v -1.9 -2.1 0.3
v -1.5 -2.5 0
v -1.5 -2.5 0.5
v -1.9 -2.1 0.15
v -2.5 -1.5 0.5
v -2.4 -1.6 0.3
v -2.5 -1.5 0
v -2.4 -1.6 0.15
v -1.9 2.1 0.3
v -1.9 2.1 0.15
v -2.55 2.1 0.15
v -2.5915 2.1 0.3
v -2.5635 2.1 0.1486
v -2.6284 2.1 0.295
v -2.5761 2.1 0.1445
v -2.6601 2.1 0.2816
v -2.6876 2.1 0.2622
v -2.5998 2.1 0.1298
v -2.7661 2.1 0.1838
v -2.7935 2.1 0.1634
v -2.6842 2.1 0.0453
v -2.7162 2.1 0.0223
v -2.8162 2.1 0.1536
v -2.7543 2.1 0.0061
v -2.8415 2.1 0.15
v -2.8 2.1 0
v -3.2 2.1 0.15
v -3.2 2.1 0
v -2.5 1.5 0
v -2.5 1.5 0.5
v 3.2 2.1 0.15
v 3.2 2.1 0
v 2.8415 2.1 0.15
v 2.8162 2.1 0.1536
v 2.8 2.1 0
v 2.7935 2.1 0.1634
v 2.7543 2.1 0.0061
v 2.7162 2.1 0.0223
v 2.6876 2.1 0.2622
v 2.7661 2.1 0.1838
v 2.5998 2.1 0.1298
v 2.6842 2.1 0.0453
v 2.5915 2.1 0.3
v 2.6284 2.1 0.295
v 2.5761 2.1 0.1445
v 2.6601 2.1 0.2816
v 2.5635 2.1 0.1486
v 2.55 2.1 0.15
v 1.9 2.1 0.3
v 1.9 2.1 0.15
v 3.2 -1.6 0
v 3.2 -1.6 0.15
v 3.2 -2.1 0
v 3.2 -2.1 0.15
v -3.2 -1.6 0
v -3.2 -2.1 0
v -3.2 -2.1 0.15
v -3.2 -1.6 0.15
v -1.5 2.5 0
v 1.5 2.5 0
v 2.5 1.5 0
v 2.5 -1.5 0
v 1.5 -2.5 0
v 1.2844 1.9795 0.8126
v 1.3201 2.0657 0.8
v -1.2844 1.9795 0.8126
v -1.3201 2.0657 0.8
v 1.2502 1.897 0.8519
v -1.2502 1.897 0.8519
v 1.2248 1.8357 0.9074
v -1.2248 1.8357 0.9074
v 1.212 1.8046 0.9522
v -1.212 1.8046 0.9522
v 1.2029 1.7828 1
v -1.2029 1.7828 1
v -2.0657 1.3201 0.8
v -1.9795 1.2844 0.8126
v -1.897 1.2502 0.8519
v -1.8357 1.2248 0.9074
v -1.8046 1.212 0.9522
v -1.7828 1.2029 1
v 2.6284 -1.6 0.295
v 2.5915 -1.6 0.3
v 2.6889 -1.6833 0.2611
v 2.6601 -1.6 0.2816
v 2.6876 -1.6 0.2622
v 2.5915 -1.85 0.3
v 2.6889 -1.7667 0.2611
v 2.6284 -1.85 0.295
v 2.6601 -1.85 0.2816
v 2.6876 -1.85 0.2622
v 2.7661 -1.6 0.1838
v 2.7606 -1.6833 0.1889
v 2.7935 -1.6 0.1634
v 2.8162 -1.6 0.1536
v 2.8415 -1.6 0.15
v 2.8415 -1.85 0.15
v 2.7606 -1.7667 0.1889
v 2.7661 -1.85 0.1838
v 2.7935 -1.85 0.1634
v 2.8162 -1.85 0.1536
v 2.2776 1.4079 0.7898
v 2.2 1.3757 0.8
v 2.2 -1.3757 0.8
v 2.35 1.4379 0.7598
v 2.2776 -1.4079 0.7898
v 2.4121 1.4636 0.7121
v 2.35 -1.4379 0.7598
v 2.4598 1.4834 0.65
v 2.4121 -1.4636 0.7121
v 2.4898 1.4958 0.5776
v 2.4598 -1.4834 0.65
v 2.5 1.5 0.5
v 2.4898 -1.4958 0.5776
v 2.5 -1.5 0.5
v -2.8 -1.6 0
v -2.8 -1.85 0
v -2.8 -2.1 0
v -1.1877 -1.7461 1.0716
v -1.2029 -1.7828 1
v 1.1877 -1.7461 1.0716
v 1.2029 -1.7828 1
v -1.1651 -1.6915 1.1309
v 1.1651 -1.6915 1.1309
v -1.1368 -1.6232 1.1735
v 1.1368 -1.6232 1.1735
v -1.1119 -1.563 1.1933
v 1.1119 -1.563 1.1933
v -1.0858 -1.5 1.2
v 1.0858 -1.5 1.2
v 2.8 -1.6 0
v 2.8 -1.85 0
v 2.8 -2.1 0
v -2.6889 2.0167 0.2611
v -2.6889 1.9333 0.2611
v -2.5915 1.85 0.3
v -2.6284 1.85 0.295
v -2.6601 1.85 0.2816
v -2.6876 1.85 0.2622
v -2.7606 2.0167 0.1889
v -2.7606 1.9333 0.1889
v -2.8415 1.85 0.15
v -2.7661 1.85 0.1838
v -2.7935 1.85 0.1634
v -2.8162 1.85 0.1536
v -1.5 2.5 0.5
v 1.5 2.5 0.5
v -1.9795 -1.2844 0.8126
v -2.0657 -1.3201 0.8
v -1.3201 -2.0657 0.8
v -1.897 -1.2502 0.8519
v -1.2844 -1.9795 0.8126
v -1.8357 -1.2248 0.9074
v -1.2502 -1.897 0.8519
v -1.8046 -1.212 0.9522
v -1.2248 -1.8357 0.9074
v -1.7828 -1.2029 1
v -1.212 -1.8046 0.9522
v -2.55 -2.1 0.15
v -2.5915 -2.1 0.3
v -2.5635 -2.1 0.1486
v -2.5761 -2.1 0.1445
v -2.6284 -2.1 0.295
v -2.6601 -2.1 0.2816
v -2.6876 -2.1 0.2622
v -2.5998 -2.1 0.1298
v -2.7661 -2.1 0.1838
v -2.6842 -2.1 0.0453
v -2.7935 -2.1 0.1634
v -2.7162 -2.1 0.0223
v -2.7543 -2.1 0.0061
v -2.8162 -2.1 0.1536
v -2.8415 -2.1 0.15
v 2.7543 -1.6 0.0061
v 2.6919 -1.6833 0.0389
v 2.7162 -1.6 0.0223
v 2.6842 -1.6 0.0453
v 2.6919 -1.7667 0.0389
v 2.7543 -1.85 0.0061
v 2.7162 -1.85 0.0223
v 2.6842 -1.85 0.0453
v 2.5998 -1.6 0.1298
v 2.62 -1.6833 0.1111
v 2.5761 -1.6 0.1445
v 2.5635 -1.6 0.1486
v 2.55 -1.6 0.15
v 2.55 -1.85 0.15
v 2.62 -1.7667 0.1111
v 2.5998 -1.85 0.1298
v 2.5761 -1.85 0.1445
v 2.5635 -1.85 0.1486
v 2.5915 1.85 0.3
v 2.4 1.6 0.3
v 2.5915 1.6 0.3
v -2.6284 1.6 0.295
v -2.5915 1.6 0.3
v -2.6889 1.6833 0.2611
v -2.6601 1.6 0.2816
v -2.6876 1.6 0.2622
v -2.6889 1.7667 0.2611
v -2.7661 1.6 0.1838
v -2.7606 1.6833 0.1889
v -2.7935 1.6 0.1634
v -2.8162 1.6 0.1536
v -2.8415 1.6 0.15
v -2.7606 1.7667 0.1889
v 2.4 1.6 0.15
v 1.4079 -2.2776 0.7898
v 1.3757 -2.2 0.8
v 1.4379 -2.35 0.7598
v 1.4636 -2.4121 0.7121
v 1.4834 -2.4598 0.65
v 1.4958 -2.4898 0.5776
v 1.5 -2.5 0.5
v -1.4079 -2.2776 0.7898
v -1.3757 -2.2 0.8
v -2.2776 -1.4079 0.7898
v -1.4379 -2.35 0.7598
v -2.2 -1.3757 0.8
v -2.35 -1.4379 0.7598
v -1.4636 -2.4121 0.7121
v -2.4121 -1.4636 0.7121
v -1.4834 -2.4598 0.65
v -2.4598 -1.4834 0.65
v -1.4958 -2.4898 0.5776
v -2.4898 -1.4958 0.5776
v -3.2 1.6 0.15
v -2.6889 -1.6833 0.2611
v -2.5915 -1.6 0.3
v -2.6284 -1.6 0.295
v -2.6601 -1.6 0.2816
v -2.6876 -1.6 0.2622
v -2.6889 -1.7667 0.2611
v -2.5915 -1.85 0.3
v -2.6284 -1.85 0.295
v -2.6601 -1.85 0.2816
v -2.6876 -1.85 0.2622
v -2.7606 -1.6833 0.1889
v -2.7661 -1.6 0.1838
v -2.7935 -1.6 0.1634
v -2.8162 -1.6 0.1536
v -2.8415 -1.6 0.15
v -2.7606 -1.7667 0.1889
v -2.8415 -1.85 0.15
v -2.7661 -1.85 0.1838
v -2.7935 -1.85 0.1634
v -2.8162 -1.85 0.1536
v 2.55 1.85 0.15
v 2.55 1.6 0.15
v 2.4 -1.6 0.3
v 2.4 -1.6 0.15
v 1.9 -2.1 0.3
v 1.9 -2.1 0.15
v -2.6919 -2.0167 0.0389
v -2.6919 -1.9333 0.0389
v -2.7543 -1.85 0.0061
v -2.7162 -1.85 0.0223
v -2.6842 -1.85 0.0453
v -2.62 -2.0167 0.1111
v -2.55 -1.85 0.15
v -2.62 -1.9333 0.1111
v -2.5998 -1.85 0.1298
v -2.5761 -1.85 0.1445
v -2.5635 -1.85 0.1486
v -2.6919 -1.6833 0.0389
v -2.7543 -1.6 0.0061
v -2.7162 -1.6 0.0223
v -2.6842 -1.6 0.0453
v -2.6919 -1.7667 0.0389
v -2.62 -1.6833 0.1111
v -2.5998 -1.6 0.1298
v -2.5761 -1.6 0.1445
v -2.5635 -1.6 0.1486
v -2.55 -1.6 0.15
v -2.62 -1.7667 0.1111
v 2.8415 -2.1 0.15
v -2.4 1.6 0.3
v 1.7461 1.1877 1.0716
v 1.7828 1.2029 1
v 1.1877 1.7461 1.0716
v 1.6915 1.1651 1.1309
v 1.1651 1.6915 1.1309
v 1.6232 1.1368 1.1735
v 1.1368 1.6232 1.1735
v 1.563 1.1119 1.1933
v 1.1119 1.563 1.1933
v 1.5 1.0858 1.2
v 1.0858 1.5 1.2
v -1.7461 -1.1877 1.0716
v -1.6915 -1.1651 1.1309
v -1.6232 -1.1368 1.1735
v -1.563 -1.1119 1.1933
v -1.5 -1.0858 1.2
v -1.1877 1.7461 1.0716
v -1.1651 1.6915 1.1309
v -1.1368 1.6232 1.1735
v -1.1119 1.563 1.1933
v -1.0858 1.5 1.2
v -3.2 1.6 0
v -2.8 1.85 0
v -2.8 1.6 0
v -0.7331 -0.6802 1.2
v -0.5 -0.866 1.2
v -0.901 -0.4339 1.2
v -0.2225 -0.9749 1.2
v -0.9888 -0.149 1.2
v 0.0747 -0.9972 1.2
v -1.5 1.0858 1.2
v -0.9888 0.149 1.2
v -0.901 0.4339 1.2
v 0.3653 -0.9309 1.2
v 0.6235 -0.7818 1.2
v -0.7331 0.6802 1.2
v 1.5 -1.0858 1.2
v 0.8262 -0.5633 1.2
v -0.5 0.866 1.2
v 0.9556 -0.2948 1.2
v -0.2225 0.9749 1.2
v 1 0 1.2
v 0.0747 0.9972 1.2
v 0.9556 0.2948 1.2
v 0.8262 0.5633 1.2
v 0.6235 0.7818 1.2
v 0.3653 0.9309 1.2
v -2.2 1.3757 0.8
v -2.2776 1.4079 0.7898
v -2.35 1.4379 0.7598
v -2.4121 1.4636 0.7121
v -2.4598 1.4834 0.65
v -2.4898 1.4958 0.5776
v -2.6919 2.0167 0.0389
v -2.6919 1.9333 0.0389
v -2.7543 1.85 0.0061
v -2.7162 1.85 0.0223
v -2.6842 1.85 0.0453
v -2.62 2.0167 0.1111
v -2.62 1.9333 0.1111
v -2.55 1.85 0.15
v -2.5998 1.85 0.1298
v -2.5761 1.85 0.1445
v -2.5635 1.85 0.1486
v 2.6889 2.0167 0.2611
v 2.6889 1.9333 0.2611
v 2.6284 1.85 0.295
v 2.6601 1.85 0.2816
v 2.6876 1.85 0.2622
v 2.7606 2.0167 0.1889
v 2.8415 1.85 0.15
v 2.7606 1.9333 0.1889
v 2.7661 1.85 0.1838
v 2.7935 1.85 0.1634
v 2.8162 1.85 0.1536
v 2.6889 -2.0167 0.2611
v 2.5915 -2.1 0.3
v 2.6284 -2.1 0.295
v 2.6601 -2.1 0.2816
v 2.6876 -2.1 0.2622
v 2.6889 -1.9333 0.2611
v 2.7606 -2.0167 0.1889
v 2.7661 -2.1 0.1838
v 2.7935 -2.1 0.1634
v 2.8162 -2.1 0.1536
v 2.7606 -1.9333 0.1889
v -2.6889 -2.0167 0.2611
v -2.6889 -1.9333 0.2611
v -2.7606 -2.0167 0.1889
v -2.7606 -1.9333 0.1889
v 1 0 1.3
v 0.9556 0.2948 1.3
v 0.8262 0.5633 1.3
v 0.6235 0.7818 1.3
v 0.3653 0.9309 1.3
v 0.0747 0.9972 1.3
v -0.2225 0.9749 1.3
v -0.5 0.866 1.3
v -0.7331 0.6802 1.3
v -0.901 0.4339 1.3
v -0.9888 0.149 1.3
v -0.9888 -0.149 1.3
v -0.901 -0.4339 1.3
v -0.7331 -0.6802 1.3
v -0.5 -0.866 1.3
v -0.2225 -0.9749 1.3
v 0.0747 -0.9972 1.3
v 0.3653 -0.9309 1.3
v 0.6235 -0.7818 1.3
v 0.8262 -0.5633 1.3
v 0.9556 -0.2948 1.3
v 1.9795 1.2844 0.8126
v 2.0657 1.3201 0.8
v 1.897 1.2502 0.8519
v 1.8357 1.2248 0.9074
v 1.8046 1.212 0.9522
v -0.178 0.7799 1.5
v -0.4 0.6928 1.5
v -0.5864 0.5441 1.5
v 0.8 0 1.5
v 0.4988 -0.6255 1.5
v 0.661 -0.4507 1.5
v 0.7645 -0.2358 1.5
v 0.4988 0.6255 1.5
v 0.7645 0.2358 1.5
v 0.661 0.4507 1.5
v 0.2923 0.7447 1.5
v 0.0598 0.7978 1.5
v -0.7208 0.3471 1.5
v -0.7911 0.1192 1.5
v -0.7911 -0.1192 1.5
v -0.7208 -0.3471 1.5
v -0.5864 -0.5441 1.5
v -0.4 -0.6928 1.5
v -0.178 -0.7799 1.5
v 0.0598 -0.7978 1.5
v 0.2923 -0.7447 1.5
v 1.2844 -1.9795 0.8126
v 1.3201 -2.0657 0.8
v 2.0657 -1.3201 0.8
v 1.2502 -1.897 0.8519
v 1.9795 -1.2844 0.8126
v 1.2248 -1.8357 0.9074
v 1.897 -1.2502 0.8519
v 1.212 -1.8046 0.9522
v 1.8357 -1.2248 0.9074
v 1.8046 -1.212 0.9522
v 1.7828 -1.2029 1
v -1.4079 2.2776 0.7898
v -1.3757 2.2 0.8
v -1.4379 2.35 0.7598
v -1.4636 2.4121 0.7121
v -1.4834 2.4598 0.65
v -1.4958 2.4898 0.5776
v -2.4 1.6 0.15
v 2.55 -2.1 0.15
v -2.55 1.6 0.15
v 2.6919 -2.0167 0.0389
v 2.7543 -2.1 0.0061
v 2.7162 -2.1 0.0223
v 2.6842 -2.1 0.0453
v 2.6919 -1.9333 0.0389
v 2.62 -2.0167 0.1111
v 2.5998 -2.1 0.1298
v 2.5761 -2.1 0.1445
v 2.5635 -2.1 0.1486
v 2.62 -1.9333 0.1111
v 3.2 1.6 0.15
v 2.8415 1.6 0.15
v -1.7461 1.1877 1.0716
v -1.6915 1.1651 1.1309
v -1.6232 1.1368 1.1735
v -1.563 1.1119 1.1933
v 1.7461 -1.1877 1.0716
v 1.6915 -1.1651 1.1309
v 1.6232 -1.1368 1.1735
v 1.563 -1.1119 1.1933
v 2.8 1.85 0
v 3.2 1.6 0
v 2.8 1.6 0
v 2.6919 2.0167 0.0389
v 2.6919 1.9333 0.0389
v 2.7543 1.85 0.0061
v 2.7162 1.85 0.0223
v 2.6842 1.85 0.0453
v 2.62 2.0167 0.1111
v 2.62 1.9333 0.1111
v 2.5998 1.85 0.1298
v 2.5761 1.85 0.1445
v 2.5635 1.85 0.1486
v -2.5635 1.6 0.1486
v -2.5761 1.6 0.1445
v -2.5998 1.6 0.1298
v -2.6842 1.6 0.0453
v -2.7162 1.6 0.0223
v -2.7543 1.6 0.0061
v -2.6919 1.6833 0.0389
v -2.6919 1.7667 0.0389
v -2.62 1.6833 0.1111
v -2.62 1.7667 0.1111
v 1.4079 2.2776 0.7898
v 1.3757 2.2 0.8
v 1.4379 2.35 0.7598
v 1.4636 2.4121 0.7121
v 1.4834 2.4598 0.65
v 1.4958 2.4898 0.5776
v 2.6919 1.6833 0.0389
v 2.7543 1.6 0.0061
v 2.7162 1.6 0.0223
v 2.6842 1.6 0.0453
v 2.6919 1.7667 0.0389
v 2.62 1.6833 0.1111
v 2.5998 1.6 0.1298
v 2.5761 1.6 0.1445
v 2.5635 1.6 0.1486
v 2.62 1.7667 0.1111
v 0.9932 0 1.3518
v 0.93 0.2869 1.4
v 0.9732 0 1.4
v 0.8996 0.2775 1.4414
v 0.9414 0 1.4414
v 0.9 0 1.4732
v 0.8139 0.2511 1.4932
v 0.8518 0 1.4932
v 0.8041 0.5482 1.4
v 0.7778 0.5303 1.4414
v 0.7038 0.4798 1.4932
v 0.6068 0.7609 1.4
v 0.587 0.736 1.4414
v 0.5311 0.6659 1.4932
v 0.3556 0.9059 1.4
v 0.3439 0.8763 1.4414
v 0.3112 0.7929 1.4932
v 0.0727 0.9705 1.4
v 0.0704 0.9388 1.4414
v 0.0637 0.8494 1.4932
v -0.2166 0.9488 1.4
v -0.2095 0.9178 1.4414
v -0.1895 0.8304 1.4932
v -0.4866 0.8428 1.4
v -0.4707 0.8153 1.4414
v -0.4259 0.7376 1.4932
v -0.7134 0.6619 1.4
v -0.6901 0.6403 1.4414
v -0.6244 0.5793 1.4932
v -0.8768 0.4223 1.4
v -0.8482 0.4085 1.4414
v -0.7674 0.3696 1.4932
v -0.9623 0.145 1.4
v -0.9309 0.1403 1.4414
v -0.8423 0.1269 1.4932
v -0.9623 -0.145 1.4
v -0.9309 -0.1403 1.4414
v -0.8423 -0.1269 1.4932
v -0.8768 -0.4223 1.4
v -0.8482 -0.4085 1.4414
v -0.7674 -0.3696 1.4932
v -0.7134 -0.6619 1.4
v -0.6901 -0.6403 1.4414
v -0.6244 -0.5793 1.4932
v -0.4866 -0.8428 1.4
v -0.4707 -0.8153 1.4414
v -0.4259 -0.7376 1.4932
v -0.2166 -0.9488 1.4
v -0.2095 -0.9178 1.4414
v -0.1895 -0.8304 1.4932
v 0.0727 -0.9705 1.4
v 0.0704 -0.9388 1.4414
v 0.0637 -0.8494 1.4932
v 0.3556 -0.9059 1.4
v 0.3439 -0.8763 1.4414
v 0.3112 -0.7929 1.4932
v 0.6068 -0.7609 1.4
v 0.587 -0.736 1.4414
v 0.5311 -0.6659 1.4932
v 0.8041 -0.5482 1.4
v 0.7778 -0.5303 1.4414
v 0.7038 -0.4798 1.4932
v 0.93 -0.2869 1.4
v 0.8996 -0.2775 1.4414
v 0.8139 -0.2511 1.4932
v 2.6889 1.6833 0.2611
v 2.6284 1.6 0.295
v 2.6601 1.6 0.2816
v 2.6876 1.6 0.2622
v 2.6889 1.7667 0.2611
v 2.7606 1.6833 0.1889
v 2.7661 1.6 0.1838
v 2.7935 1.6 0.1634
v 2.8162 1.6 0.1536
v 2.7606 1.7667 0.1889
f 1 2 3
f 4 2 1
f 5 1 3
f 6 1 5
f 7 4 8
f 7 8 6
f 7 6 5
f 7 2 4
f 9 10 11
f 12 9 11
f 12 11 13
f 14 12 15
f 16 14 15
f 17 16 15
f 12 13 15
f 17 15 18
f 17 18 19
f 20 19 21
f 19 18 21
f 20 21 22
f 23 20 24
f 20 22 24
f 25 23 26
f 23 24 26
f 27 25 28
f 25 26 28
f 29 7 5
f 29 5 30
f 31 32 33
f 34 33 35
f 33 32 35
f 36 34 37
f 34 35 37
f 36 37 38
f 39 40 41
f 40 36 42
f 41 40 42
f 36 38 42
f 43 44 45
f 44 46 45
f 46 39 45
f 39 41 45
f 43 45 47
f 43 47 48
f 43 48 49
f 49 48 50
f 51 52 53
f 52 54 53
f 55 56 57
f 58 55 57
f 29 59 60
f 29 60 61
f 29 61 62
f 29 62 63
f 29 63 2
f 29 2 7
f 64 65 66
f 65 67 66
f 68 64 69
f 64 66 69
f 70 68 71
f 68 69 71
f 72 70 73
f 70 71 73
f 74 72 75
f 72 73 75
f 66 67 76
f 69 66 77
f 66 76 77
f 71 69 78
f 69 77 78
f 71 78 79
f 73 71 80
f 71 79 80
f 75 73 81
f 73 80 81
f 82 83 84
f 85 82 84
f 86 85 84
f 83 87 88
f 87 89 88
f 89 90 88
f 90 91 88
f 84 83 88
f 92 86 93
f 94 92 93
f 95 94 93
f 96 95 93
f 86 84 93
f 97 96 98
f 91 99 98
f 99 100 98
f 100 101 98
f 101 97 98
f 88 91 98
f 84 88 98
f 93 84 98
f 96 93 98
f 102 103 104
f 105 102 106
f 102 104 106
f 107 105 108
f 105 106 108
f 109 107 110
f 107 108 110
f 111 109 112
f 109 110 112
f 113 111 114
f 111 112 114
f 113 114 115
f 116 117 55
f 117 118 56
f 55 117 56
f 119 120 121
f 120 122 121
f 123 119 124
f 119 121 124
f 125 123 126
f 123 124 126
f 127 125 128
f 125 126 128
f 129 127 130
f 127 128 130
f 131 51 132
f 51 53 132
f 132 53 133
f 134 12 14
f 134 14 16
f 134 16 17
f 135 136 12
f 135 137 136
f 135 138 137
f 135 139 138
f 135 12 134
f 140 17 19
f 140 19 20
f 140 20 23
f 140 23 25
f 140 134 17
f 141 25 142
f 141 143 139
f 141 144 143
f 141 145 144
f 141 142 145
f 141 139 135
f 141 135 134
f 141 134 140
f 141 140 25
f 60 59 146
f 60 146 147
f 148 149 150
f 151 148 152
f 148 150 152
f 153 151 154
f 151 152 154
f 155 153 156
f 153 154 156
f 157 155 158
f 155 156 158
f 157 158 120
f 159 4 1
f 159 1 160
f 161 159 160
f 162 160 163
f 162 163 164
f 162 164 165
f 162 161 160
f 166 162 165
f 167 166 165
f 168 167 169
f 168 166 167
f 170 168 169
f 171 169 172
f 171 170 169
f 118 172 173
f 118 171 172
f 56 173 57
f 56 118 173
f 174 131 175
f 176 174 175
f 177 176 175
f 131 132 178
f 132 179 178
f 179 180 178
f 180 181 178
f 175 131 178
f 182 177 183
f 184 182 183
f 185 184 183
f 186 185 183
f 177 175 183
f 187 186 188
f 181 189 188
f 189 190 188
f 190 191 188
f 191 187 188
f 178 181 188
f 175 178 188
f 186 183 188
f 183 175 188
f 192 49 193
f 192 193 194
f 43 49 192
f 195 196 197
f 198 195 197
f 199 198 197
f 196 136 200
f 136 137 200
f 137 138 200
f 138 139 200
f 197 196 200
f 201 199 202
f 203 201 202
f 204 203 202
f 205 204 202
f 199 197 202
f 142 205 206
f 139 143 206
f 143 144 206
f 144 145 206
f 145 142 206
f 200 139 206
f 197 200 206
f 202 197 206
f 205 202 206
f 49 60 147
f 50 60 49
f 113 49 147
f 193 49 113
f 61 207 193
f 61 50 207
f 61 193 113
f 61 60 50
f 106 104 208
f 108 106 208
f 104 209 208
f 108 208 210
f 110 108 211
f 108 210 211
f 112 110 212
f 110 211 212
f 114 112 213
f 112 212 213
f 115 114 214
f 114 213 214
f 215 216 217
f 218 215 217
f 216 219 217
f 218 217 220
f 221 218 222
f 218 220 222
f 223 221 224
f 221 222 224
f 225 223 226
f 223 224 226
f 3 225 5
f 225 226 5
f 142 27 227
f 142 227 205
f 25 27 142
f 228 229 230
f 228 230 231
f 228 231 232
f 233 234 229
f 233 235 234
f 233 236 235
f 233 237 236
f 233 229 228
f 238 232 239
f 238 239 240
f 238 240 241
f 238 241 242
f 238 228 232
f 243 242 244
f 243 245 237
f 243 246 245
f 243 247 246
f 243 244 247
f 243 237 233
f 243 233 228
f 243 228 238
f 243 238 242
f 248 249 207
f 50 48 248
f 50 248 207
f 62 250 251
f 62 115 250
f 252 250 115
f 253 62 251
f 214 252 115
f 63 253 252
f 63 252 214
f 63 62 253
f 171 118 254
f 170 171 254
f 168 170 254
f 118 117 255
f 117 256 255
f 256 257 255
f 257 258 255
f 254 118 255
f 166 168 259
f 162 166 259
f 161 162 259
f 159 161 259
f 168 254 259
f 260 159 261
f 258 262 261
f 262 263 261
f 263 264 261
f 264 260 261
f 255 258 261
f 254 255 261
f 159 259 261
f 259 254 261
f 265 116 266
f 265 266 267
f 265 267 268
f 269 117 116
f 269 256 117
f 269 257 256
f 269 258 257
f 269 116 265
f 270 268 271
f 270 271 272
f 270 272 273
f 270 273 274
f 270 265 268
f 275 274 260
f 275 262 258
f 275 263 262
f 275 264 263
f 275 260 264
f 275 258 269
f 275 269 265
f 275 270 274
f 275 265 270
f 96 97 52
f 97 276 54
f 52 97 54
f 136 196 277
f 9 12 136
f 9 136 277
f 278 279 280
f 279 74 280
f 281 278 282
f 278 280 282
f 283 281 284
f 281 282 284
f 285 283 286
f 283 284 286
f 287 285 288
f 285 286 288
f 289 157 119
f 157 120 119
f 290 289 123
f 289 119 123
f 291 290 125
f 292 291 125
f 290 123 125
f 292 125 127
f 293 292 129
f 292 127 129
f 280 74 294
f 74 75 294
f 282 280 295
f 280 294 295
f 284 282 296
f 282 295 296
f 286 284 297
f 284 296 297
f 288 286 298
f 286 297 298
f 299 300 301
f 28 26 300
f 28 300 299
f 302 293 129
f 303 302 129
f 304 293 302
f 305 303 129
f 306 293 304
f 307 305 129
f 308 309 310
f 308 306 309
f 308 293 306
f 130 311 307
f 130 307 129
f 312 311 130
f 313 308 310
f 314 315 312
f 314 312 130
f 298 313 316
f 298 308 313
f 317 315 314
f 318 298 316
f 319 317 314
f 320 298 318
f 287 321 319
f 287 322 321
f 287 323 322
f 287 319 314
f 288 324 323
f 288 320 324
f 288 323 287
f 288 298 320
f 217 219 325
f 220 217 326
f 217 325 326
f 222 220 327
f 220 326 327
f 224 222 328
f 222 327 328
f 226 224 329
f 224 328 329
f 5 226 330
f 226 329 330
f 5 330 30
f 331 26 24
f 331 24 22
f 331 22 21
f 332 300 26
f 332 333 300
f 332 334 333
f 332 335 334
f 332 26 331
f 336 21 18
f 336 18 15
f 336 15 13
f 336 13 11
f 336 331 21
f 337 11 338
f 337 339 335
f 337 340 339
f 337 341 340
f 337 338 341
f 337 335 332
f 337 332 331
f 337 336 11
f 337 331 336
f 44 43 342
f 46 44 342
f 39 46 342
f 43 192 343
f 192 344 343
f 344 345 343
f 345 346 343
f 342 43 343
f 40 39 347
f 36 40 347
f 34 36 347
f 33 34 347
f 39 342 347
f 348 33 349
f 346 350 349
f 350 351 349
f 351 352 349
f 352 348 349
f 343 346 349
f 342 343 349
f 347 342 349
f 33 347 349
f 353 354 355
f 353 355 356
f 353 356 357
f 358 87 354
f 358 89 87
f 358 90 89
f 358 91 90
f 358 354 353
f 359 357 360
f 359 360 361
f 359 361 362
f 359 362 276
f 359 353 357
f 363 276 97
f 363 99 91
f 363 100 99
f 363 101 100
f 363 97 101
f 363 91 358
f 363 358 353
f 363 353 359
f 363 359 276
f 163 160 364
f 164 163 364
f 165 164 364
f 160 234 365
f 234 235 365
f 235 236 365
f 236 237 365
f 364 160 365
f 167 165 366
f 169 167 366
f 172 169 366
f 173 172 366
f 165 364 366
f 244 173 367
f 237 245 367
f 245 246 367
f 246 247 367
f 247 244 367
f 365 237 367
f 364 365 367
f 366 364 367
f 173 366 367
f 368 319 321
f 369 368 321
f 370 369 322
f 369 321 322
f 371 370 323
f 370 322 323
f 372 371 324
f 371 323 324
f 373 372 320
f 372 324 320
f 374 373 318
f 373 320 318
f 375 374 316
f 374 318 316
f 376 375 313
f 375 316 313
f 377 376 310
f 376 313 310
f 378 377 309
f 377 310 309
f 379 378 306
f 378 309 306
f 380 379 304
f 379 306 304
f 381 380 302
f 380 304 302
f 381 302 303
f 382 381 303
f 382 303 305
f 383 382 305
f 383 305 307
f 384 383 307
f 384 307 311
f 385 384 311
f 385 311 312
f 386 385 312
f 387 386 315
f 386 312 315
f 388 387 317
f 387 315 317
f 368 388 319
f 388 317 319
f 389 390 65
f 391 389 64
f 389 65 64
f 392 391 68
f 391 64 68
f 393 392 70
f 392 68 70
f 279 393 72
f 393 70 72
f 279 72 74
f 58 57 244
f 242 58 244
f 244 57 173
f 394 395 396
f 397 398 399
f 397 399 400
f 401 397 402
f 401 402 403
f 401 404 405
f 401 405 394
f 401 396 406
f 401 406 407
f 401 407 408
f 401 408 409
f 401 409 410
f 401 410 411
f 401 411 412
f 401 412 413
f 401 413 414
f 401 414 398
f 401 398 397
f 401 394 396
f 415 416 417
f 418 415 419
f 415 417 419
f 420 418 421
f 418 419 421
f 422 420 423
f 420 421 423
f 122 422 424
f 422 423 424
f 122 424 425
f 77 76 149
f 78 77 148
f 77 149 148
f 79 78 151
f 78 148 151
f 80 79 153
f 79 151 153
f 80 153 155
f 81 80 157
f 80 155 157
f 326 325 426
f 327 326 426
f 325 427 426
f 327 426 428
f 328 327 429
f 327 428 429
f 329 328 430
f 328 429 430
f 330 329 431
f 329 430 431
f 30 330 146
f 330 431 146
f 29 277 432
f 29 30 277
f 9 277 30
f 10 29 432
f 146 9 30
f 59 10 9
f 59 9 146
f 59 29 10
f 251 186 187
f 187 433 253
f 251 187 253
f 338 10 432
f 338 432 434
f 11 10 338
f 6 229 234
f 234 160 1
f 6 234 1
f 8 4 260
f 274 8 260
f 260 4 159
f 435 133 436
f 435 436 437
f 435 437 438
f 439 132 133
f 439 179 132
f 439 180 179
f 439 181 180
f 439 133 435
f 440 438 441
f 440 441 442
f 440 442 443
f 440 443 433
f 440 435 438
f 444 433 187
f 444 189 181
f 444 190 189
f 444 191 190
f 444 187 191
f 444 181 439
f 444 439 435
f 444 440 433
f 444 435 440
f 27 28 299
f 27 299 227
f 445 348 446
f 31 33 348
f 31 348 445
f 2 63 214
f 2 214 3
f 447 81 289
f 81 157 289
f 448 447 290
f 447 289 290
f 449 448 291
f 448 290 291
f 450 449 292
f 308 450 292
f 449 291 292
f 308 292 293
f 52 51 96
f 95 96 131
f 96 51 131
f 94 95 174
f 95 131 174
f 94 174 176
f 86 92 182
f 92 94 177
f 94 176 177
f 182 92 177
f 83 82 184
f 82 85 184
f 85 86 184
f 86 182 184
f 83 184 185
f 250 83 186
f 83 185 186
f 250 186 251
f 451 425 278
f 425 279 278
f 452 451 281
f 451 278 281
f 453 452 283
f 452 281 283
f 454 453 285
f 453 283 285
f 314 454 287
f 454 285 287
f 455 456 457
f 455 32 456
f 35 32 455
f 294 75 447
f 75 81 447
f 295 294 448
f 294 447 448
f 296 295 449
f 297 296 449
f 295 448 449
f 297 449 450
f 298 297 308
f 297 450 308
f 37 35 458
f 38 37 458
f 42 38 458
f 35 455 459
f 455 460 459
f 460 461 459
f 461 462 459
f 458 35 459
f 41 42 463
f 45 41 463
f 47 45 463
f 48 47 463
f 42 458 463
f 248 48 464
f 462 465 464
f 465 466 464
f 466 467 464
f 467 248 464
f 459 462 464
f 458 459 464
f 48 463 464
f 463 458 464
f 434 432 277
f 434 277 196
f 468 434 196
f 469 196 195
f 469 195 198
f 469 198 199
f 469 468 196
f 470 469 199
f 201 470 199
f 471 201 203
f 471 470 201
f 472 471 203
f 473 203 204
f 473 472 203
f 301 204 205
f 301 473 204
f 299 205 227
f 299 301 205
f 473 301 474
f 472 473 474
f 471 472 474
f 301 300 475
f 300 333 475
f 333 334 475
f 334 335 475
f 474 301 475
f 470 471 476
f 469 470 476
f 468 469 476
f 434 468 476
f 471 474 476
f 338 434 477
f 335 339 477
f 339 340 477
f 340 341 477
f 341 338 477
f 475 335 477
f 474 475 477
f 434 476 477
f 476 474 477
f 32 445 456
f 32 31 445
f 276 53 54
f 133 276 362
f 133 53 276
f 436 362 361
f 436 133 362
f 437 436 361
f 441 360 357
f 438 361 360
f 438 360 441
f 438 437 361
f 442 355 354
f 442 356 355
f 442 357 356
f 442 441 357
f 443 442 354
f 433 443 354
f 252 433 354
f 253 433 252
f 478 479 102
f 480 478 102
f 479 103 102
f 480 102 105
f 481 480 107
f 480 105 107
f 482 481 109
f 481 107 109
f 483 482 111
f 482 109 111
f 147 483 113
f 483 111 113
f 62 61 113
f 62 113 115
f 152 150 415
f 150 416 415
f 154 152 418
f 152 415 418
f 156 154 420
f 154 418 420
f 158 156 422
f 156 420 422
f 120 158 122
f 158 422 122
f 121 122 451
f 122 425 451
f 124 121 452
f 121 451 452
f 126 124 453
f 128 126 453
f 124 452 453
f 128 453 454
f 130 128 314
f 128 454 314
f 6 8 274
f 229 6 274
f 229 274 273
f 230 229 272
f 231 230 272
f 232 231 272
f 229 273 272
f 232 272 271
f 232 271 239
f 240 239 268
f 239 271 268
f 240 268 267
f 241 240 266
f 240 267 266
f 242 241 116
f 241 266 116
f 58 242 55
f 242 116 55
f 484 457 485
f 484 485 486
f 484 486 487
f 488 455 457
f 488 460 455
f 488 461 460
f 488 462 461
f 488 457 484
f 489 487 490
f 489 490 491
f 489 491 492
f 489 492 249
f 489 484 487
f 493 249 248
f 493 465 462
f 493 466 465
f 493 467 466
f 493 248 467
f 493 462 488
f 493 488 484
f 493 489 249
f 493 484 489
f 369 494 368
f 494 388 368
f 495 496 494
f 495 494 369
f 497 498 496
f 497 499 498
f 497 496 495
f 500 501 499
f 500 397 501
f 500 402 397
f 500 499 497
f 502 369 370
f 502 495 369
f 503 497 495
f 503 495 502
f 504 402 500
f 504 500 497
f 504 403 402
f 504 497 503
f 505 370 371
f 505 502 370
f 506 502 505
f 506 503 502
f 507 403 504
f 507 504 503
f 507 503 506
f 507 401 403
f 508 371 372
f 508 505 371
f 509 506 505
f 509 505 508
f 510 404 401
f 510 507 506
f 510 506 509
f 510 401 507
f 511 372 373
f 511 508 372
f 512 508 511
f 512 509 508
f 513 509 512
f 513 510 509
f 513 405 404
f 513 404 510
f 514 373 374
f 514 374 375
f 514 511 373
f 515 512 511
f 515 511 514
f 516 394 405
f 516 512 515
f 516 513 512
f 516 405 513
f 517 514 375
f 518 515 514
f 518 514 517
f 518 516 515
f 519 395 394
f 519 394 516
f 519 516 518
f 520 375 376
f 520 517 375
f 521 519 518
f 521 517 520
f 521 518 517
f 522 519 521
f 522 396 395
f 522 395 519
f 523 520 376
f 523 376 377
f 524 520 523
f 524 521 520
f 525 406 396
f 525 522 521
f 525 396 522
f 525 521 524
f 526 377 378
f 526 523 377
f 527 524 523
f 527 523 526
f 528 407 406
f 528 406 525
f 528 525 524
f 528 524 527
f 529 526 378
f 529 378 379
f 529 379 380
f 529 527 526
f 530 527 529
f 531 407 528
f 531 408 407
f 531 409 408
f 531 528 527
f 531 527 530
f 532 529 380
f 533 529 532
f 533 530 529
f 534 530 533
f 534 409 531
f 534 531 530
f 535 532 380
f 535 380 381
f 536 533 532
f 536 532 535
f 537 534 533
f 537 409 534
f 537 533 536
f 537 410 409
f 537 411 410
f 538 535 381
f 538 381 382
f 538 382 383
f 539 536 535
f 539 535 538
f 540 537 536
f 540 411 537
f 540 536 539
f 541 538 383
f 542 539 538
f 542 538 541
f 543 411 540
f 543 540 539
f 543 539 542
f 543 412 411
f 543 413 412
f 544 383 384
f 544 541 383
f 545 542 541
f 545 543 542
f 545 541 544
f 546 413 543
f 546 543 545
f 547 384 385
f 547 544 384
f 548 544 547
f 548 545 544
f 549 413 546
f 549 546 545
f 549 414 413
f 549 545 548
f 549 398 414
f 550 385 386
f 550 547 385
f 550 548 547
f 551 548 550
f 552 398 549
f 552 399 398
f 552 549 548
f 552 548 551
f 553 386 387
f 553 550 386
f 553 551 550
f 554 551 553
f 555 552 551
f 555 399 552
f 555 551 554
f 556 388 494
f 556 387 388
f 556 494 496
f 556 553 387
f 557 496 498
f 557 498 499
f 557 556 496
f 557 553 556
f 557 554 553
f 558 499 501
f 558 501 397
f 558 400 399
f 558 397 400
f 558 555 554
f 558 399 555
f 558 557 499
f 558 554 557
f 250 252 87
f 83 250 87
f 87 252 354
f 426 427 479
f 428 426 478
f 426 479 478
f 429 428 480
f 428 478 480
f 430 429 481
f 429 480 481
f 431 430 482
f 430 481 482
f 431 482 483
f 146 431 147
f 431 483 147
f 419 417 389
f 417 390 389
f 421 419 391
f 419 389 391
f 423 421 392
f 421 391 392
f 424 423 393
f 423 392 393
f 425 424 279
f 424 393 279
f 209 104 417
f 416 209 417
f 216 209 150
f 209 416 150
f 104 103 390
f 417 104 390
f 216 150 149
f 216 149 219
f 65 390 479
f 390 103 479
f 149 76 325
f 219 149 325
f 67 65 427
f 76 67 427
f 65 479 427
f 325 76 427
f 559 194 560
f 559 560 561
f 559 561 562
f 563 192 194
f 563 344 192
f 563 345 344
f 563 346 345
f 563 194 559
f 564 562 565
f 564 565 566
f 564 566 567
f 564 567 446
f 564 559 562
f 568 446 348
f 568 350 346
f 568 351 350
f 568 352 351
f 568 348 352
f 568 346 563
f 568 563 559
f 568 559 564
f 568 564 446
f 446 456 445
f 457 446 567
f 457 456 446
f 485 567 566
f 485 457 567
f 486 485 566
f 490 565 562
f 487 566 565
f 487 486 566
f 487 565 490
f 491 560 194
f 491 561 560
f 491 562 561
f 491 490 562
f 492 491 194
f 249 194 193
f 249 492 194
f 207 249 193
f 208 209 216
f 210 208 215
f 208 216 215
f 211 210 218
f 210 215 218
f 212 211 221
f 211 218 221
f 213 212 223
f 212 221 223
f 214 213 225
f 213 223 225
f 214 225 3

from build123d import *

# Parameters (mm, degrees)
BOSS_EXTRUDE1_DEPTH = 0.8
BOSS_EXTRUDE2_DEPTH = 0.4
SKETCH3_R           = 1
BOSS_EXTRUDE3_DEPTH = 0.3
FILLET1_R           = 0.3
FILLET2_R           = 0.3
FILLET3_R           = 0.3
FILLET4_R           = 0.2
BOSS_EXTRUDE4_DEPTH = 0.25


with BuildPart() as part:
    # Sketch1 → Boss-Extrude1 (new body)
    with BuildSketch(Plane.XY):
        Polygon((-1.5, 2.5), (1.5, 2.5), (2.5, 1.5), (2.5, -1.5), (1.5, -2.5), (-1.5, -2.5), (-2.5, -1.5), (-2.5, 1.5), align=None)
    extrude(amount=BOSS_EXTRUDE1_DEPTH)

    # Sketch2 → Boss-Extrude2 (add)
    with BuildSketch(Plane.XY.offset(0.8)):
        Polygon((-1.210050506, 1.8), (-1.8, 1.210050506), (-1.8, -1.210050506), (-1.210050506, -1.8), (1.210050506, -1.8), (1.8, -1.210050506), (1.8, 1.210050506), (1.210050506, 1.8), align=None)
    extrude(amount=BOSS_EXTRUDE2_DEPTH)

    # Sketch3 → Boss-Extrude3 (add)
    with BuildSketch(Plane.XY.offset(1.2)):
        Circle(SKETCH3_R)
    extrude(amount=BOSS_EXTRUDE3_DEPTH)

    # Fillet1
    fillet1_edges = [part.edges().sort_by_distance(p)[0] for p in [
        (1.505025253, 1.505025253, 1.2),
        (0, 1.8, 1.2),
        (-1.505025253, 1.505025253, 1.2),
        (-1.8, 0, 1.2),
        (-1.505025253, -1.505025253, 1.2),
        (0, -1.8, 1.2),
        (1.505025253, -1.505025253, 1.2),
        (1.8, 0, 1.2),
    ]]
    fillet(fillet1_edges, radius=FILLET1_R)

    # Fillet2
    fillet2_edges = [part.edges().sort_by_distance(p)[0] for p in [
        (-2, 2, 0.8),
        (-2.5, 0, 0.8),
        (-2, -2, 0.8),
        (0, -2.5, 0.8),
        (2, -2, 0.8),
        (2.5, 0, 0.8),
        (2, 2, 0.8),
        (0, 2.5, 0.8),
    ]]
    fillet(fillet2_edges, radius=FILLET2_R)

    # Fillet3
    fillet3_edges = [part.edges().sort_by_distance(p)[0] for p in [
        (0, -1.8, 0.8),
        (1.505025253, -1.505025253, 0.8),
        (1.8, 0, 0.8),
        (1.505025253, 1.505025253, 0.8),
        (0, 1.8, 0.8),
        (-1.505025253, 1.505025253, 0.8),
        (-1.8, 0, 0.8),
        (-1.505025253, -1.505025253, 0.8),
    ]]
    fillet(fillet3_edges, radius=FILLET3_R)

    # Fillet4
    fillet4_edges = [part.edges().sort_by_distance(p)[0] for p in [
        (-1, 0, 1.5),
    ]]
    fillet(fillet4_edges, radius=FILLET4_R)

    # Sketch4 → Boss-Extrude4 (add, symmetric)
    with BuildSketch(Plane(origin=(0, 1.85, 0), x_dir=(1, 0, 0), z_dir=(0, 1, 0))):
        with BuildLine():
            Line((0, -0.15), (-2.55, -0.15))
            add(Edge.make_bspline(
                [(-2.8, 0), (-2.662431202, 0), (-2.630462892, -0.15), (-2.55, -0.15)],
                knots=[0, 0, 0, 0, 1, 1, 1, 1], degree=3))
            Line((-2.8, 0), (-3.2, 0))
            Line((-3.2, 0), (-3.2, -0.15))
            Line((-3.2, -0.15), (-2.841547595, -0.15))
            add(Edge.make_bspline(
                [(-2.591547595, -0.3), (-2.713318055, -0.3), (-2.744365063, -0.15), (-2.841547595, -0.15)],
                knots=[0, 0, 0, 0, 1, 1, 1, 1], degree=3))
            Line((-2.591547595, -0.3), (0, -0.3))
            Line((0, -0.3), (2.591547595, -0.3))
            add(Edge.make_bspline(
                [(2.591547595, -0.3), (2.713318055, -0.3), (2.744365063, -0.15), (2.841547595, -0.15)],
                knots=[0, 0, 0, 0, 1, 1, 1, 1], degree=3))
            Line((2.841547595, -0.15), (3.2, -0.15))
            Line((3.2, -0.15), (3.2, 0))
            Line((3.2, 0), (2.8, 0))
            add(Edge.make_bspline(
                [(2.8, 0), (2.662431202, 0), (2.630462892, -0.15), (2.55, -0.15)],
                knots=[0, 0, 0, 0, 1, 1, 1, 1], degree=3))
            Line((2.55, -0.15), (0, -0.15))
        make_face()
    boss_extrude4 = extrude(amount=BOSS_EXTRUDE4_DEPTH, both=True)

    # Mirror1: Boss-Extrude4 across plane
    add(boss_extrude4.mirror(Plane.ZX))


solid = part.part
